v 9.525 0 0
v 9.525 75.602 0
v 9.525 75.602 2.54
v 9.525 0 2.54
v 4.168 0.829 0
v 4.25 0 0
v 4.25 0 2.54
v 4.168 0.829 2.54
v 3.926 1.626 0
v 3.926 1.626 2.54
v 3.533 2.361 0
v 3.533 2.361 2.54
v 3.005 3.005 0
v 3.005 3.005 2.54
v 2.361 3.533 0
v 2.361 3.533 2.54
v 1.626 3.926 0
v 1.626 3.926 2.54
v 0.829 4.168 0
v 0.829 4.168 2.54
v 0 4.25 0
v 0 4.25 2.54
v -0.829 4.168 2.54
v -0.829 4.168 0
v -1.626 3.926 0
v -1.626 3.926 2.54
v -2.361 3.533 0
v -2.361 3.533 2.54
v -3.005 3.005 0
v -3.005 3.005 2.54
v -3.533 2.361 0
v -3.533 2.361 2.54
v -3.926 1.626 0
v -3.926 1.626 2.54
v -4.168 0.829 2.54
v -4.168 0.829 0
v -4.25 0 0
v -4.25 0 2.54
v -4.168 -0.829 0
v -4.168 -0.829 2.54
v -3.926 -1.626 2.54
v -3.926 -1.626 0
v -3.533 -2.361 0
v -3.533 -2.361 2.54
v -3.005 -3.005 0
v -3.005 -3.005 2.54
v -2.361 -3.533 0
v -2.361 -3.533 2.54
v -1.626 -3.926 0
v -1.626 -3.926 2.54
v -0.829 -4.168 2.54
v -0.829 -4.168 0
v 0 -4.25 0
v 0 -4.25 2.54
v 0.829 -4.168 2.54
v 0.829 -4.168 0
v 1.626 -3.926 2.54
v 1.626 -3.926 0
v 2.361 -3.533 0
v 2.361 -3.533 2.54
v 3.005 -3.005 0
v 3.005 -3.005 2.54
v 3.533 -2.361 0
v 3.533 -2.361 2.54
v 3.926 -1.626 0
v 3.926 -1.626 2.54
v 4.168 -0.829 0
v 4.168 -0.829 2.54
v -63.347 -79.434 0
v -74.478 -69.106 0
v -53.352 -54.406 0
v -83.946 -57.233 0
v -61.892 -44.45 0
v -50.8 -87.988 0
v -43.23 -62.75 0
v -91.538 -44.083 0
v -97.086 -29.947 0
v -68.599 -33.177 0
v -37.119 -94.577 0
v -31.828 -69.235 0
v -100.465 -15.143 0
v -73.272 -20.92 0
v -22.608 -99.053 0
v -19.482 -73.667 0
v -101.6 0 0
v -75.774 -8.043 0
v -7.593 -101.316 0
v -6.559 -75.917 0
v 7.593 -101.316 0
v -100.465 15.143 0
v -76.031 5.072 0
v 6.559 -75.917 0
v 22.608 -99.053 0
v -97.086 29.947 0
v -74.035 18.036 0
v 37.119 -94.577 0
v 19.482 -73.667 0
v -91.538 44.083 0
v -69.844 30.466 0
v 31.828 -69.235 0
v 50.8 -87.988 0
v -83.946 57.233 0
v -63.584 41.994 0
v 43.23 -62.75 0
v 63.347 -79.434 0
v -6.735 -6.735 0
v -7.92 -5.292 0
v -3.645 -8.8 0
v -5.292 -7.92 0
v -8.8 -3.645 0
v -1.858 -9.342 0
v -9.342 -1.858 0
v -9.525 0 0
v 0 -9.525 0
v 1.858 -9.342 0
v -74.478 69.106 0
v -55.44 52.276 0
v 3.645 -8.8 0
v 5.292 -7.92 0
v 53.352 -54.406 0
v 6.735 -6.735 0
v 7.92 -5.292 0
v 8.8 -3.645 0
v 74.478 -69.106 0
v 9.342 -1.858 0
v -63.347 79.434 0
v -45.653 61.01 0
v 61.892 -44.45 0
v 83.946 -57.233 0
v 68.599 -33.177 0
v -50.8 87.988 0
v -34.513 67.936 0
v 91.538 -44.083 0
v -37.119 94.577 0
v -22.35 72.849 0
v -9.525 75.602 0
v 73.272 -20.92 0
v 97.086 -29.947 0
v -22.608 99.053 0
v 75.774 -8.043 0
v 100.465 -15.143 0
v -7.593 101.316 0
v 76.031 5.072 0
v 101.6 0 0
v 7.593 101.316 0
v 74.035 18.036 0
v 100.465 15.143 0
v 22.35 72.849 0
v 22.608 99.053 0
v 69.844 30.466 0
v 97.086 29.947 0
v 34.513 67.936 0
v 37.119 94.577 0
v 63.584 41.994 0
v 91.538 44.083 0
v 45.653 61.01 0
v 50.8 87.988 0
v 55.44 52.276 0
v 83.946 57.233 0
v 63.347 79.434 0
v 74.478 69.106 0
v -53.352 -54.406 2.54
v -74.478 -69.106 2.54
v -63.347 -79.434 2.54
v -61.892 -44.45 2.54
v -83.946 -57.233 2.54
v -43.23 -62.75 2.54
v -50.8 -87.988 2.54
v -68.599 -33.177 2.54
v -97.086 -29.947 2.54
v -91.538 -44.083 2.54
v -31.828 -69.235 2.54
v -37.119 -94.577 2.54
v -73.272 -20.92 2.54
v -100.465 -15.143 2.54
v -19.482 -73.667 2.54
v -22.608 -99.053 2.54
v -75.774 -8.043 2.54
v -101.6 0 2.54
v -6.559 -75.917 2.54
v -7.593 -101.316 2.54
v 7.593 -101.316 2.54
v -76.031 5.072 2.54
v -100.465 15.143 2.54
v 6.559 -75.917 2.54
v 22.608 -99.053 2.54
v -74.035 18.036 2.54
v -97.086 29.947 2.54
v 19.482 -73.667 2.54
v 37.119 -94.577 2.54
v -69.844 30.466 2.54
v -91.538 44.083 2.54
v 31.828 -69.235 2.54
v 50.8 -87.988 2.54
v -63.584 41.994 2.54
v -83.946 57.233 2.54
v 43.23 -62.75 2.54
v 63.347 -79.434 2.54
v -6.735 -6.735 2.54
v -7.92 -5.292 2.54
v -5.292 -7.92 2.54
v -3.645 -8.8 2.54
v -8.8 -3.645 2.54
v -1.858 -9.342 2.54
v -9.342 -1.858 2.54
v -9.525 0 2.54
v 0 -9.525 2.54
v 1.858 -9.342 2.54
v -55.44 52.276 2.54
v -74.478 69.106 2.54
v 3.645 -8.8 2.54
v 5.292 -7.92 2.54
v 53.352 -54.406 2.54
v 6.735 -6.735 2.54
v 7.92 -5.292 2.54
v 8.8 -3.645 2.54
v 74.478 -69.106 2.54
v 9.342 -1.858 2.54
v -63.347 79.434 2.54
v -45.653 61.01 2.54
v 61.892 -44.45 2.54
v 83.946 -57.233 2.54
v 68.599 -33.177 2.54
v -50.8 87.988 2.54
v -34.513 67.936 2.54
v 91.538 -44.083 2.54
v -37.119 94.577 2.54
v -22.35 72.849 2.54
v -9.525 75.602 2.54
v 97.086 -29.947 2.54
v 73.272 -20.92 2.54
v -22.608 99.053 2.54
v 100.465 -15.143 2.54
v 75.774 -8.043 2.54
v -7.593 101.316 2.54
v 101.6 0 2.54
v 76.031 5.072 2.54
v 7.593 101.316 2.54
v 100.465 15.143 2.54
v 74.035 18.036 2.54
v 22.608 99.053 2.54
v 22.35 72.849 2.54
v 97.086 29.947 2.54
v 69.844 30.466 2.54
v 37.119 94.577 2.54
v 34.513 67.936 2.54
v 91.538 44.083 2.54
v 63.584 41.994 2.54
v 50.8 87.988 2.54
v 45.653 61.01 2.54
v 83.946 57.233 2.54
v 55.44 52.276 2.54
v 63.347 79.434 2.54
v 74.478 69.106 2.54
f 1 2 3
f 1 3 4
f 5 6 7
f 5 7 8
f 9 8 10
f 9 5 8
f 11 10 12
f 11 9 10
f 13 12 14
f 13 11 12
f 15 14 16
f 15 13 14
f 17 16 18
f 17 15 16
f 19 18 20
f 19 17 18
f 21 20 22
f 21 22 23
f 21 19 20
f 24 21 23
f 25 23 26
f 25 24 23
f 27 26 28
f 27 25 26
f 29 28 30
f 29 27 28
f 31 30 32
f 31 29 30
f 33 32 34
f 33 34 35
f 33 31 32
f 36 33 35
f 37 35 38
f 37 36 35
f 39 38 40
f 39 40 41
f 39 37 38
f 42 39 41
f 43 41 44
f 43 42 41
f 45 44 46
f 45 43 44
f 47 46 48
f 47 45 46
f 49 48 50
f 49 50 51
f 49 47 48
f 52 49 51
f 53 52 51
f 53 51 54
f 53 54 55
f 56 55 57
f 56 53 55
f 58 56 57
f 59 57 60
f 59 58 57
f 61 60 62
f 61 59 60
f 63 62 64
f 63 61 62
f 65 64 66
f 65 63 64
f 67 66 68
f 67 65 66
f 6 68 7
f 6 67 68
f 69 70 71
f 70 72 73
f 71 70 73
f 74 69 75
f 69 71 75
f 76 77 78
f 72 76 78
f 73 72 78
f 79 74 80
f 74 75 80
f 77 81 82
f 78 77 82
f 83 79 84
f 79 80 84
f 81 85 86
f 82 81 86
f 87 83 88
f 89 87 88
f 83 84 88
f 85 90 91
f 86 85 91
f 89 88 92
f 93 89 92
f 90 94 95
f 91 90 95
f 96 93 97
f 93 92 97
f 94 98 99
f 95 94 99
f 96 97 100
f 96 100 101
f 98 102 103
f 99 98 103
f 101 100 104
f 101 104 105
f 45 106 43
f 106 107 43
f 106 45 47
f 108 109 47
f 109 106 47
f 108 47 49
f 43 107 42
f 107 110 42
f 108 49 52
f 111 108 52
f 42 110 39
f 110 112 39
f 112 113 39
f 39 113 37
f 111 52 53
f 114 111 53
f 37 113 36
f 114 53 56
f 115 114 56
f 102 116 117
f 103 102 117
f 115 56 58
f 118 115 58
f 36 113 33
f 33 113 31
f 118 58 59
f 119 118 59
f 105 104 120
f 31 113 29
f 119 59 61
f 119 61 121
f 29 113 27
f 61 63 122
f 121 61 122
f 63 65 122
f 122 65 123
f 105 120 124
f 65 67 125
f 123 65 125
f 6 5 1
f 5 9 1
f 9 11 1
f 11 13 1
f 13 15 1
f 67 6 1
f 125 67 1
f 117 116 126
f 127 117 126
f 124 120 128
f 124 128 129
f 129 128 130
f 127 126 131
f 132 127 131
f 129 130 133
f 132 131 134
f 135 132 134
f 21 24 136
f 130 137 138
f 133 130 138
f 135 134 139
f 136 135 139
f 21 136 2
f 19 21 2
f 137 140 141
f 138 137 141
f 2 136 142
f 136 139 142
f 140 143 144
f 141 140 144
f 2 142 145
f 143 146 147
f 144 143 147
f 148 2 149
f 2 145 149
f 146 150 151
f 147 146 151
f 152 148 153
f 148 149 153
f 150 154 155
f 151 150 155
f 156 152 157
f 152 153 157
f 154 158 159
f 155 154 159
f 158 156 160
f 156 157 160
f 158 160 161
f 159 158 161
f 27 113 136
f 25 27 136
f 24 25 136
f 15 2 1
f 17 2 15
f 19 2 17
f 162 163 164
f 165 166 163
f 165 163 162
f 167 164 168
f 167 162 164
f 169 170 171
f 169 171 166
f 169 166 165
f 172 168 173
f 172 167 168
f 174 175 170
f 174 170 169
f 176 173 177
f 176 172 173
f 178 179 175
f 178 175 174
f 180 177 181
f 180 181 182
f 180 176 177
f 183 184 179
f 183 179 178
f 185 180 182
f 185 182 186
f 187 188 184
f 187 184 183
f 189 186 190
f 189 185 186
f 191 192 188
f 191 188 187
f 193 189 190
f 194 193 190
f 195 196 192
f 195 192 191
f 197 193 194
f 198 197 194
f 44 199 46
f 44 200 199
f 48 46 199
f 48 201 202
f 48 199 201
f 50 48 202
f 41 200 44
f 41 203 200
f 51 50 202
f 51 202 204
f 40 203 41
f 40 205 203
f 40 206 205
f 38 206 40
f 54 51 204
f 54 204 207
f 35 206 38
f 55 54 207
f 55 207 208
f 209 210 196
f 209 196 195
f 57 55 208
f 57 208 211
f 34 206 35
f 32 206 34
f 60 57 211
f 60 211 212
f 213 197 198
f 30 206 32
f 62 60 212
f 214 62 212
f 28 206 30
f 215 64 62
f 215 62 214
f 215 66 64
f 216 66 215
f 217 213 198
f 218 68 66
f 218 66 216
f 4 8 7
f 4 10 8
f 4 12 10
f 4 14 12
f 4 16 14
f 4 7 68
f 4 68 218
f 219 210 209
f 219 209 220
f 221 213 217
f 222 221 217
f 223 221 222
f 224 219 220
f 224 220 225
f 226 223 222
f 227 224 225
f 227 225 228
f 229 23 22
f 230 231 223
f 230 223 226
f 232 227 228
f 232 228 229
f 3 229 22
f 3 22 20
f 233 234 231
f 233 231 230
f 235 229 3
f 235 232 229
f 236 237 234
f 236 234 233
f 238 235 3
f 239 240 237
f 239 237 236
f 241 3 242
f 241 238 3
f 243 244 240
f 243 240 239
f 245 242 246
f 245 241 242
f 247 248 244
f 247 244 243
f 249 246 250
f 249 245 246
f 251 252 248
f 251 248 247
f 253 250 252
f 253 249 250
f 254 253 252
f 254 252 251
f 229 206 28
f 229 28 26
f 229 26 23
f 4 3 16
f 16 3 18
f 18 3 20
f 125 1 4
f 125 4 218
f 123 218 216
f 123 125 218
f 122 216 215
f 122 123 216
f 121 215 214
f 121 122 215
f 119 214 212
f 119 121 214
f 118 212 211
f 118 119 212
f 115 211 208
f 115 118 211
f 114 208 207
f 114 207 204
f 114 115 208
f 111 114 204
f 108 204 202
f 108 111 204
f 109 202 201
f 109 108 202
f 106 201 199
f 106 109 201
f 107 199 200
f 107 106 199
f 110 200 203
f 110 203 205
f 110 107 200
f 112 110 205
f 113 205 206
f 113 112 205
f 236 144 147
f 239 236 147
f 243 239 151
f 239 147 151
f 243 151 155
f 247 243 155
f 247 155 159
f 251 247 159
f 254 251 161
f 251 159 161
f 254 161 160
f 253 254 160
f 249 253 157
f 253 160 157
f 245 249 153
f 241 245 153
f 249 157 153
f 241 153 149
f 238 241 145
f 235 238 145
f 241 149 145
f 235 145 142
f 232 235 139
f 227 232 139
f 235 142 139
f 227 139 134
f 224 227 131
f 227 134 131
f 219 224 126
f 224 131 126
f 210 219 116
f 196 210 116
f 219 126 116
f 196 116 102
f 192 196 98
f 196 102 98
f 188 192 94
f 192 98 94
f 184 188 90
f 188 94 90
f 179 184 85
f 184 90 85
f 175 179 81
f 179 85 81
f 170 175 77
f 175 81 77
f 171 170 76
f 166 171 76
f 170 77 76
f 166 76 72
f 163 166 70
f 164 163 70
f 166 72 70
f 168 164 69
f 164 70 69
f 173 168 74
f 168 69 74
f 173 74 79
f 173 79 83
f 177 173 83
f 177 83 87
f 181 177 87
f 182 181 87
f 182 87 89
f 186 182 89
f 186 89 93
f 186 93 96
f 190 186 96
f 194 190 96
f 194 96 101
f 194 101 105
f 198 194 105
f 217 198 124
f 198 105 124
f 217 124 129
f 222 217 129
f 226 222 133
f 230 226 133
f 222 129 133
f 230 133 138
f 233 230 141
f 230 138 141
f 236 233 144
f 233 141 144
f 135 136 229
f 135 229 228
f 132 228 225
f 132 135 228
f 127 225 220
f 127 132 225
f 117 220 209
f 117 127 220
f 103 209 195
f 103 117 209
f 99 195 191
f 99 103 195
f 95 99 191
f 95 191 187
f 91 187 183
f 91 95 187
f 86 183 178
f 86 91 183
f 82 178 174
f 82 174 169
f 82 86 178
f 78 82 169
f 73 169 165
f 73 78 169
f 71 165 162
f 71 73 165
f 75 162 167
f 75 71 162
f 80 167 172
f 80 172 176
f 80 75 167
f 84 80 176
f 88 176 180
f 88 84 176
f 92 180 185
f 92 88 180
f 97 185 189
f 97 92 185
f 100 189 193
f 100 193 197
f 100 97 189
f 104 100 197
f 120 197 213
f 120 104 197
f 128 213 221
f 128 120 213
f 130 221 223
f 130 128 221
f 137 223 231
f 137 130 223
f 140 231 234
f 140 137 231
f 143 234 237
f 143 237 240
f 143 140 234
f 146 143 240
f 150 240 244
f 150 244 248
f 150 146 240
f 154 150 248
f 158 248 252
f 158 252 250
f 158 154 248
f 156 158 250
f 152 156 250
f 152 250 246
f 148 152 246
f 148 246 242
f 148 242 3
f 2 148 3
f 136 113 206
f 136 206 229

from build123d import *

# Parameters (mm, degrees)
SKETCH1_R           = 101.6
SKETCH1_R_2         = 4.24957387
BOSS_EXTRUDE1_DEPTH = 2.54


with BuildPart() as part:
    # Sketch1 → Boss-Extrude1 (new body)
    with BuildSketch(Plane.XY):
        Circle(SKETCH1_R)
        Circle(SKETCH1_R_2, mode=Mode.SUBTRACT)
        with BuildLine():
            Line((-9.525, 0), (-9.525, 75.602343714))
            ThreePointArc((-9.525, 75.602343714), (0, -76.2), (9.525, 75.602343714))
            Line((9.525, 75.602343714), (9.525, 0))
            ThreePointArc((9.525, 0), (0, -9.525), (-9.525, 0))
        make_face(mode=Mode.SUBTRACT)
    extrude(amount=BOSS_EXTRUDE1_DEPTH)


solid = part.part
